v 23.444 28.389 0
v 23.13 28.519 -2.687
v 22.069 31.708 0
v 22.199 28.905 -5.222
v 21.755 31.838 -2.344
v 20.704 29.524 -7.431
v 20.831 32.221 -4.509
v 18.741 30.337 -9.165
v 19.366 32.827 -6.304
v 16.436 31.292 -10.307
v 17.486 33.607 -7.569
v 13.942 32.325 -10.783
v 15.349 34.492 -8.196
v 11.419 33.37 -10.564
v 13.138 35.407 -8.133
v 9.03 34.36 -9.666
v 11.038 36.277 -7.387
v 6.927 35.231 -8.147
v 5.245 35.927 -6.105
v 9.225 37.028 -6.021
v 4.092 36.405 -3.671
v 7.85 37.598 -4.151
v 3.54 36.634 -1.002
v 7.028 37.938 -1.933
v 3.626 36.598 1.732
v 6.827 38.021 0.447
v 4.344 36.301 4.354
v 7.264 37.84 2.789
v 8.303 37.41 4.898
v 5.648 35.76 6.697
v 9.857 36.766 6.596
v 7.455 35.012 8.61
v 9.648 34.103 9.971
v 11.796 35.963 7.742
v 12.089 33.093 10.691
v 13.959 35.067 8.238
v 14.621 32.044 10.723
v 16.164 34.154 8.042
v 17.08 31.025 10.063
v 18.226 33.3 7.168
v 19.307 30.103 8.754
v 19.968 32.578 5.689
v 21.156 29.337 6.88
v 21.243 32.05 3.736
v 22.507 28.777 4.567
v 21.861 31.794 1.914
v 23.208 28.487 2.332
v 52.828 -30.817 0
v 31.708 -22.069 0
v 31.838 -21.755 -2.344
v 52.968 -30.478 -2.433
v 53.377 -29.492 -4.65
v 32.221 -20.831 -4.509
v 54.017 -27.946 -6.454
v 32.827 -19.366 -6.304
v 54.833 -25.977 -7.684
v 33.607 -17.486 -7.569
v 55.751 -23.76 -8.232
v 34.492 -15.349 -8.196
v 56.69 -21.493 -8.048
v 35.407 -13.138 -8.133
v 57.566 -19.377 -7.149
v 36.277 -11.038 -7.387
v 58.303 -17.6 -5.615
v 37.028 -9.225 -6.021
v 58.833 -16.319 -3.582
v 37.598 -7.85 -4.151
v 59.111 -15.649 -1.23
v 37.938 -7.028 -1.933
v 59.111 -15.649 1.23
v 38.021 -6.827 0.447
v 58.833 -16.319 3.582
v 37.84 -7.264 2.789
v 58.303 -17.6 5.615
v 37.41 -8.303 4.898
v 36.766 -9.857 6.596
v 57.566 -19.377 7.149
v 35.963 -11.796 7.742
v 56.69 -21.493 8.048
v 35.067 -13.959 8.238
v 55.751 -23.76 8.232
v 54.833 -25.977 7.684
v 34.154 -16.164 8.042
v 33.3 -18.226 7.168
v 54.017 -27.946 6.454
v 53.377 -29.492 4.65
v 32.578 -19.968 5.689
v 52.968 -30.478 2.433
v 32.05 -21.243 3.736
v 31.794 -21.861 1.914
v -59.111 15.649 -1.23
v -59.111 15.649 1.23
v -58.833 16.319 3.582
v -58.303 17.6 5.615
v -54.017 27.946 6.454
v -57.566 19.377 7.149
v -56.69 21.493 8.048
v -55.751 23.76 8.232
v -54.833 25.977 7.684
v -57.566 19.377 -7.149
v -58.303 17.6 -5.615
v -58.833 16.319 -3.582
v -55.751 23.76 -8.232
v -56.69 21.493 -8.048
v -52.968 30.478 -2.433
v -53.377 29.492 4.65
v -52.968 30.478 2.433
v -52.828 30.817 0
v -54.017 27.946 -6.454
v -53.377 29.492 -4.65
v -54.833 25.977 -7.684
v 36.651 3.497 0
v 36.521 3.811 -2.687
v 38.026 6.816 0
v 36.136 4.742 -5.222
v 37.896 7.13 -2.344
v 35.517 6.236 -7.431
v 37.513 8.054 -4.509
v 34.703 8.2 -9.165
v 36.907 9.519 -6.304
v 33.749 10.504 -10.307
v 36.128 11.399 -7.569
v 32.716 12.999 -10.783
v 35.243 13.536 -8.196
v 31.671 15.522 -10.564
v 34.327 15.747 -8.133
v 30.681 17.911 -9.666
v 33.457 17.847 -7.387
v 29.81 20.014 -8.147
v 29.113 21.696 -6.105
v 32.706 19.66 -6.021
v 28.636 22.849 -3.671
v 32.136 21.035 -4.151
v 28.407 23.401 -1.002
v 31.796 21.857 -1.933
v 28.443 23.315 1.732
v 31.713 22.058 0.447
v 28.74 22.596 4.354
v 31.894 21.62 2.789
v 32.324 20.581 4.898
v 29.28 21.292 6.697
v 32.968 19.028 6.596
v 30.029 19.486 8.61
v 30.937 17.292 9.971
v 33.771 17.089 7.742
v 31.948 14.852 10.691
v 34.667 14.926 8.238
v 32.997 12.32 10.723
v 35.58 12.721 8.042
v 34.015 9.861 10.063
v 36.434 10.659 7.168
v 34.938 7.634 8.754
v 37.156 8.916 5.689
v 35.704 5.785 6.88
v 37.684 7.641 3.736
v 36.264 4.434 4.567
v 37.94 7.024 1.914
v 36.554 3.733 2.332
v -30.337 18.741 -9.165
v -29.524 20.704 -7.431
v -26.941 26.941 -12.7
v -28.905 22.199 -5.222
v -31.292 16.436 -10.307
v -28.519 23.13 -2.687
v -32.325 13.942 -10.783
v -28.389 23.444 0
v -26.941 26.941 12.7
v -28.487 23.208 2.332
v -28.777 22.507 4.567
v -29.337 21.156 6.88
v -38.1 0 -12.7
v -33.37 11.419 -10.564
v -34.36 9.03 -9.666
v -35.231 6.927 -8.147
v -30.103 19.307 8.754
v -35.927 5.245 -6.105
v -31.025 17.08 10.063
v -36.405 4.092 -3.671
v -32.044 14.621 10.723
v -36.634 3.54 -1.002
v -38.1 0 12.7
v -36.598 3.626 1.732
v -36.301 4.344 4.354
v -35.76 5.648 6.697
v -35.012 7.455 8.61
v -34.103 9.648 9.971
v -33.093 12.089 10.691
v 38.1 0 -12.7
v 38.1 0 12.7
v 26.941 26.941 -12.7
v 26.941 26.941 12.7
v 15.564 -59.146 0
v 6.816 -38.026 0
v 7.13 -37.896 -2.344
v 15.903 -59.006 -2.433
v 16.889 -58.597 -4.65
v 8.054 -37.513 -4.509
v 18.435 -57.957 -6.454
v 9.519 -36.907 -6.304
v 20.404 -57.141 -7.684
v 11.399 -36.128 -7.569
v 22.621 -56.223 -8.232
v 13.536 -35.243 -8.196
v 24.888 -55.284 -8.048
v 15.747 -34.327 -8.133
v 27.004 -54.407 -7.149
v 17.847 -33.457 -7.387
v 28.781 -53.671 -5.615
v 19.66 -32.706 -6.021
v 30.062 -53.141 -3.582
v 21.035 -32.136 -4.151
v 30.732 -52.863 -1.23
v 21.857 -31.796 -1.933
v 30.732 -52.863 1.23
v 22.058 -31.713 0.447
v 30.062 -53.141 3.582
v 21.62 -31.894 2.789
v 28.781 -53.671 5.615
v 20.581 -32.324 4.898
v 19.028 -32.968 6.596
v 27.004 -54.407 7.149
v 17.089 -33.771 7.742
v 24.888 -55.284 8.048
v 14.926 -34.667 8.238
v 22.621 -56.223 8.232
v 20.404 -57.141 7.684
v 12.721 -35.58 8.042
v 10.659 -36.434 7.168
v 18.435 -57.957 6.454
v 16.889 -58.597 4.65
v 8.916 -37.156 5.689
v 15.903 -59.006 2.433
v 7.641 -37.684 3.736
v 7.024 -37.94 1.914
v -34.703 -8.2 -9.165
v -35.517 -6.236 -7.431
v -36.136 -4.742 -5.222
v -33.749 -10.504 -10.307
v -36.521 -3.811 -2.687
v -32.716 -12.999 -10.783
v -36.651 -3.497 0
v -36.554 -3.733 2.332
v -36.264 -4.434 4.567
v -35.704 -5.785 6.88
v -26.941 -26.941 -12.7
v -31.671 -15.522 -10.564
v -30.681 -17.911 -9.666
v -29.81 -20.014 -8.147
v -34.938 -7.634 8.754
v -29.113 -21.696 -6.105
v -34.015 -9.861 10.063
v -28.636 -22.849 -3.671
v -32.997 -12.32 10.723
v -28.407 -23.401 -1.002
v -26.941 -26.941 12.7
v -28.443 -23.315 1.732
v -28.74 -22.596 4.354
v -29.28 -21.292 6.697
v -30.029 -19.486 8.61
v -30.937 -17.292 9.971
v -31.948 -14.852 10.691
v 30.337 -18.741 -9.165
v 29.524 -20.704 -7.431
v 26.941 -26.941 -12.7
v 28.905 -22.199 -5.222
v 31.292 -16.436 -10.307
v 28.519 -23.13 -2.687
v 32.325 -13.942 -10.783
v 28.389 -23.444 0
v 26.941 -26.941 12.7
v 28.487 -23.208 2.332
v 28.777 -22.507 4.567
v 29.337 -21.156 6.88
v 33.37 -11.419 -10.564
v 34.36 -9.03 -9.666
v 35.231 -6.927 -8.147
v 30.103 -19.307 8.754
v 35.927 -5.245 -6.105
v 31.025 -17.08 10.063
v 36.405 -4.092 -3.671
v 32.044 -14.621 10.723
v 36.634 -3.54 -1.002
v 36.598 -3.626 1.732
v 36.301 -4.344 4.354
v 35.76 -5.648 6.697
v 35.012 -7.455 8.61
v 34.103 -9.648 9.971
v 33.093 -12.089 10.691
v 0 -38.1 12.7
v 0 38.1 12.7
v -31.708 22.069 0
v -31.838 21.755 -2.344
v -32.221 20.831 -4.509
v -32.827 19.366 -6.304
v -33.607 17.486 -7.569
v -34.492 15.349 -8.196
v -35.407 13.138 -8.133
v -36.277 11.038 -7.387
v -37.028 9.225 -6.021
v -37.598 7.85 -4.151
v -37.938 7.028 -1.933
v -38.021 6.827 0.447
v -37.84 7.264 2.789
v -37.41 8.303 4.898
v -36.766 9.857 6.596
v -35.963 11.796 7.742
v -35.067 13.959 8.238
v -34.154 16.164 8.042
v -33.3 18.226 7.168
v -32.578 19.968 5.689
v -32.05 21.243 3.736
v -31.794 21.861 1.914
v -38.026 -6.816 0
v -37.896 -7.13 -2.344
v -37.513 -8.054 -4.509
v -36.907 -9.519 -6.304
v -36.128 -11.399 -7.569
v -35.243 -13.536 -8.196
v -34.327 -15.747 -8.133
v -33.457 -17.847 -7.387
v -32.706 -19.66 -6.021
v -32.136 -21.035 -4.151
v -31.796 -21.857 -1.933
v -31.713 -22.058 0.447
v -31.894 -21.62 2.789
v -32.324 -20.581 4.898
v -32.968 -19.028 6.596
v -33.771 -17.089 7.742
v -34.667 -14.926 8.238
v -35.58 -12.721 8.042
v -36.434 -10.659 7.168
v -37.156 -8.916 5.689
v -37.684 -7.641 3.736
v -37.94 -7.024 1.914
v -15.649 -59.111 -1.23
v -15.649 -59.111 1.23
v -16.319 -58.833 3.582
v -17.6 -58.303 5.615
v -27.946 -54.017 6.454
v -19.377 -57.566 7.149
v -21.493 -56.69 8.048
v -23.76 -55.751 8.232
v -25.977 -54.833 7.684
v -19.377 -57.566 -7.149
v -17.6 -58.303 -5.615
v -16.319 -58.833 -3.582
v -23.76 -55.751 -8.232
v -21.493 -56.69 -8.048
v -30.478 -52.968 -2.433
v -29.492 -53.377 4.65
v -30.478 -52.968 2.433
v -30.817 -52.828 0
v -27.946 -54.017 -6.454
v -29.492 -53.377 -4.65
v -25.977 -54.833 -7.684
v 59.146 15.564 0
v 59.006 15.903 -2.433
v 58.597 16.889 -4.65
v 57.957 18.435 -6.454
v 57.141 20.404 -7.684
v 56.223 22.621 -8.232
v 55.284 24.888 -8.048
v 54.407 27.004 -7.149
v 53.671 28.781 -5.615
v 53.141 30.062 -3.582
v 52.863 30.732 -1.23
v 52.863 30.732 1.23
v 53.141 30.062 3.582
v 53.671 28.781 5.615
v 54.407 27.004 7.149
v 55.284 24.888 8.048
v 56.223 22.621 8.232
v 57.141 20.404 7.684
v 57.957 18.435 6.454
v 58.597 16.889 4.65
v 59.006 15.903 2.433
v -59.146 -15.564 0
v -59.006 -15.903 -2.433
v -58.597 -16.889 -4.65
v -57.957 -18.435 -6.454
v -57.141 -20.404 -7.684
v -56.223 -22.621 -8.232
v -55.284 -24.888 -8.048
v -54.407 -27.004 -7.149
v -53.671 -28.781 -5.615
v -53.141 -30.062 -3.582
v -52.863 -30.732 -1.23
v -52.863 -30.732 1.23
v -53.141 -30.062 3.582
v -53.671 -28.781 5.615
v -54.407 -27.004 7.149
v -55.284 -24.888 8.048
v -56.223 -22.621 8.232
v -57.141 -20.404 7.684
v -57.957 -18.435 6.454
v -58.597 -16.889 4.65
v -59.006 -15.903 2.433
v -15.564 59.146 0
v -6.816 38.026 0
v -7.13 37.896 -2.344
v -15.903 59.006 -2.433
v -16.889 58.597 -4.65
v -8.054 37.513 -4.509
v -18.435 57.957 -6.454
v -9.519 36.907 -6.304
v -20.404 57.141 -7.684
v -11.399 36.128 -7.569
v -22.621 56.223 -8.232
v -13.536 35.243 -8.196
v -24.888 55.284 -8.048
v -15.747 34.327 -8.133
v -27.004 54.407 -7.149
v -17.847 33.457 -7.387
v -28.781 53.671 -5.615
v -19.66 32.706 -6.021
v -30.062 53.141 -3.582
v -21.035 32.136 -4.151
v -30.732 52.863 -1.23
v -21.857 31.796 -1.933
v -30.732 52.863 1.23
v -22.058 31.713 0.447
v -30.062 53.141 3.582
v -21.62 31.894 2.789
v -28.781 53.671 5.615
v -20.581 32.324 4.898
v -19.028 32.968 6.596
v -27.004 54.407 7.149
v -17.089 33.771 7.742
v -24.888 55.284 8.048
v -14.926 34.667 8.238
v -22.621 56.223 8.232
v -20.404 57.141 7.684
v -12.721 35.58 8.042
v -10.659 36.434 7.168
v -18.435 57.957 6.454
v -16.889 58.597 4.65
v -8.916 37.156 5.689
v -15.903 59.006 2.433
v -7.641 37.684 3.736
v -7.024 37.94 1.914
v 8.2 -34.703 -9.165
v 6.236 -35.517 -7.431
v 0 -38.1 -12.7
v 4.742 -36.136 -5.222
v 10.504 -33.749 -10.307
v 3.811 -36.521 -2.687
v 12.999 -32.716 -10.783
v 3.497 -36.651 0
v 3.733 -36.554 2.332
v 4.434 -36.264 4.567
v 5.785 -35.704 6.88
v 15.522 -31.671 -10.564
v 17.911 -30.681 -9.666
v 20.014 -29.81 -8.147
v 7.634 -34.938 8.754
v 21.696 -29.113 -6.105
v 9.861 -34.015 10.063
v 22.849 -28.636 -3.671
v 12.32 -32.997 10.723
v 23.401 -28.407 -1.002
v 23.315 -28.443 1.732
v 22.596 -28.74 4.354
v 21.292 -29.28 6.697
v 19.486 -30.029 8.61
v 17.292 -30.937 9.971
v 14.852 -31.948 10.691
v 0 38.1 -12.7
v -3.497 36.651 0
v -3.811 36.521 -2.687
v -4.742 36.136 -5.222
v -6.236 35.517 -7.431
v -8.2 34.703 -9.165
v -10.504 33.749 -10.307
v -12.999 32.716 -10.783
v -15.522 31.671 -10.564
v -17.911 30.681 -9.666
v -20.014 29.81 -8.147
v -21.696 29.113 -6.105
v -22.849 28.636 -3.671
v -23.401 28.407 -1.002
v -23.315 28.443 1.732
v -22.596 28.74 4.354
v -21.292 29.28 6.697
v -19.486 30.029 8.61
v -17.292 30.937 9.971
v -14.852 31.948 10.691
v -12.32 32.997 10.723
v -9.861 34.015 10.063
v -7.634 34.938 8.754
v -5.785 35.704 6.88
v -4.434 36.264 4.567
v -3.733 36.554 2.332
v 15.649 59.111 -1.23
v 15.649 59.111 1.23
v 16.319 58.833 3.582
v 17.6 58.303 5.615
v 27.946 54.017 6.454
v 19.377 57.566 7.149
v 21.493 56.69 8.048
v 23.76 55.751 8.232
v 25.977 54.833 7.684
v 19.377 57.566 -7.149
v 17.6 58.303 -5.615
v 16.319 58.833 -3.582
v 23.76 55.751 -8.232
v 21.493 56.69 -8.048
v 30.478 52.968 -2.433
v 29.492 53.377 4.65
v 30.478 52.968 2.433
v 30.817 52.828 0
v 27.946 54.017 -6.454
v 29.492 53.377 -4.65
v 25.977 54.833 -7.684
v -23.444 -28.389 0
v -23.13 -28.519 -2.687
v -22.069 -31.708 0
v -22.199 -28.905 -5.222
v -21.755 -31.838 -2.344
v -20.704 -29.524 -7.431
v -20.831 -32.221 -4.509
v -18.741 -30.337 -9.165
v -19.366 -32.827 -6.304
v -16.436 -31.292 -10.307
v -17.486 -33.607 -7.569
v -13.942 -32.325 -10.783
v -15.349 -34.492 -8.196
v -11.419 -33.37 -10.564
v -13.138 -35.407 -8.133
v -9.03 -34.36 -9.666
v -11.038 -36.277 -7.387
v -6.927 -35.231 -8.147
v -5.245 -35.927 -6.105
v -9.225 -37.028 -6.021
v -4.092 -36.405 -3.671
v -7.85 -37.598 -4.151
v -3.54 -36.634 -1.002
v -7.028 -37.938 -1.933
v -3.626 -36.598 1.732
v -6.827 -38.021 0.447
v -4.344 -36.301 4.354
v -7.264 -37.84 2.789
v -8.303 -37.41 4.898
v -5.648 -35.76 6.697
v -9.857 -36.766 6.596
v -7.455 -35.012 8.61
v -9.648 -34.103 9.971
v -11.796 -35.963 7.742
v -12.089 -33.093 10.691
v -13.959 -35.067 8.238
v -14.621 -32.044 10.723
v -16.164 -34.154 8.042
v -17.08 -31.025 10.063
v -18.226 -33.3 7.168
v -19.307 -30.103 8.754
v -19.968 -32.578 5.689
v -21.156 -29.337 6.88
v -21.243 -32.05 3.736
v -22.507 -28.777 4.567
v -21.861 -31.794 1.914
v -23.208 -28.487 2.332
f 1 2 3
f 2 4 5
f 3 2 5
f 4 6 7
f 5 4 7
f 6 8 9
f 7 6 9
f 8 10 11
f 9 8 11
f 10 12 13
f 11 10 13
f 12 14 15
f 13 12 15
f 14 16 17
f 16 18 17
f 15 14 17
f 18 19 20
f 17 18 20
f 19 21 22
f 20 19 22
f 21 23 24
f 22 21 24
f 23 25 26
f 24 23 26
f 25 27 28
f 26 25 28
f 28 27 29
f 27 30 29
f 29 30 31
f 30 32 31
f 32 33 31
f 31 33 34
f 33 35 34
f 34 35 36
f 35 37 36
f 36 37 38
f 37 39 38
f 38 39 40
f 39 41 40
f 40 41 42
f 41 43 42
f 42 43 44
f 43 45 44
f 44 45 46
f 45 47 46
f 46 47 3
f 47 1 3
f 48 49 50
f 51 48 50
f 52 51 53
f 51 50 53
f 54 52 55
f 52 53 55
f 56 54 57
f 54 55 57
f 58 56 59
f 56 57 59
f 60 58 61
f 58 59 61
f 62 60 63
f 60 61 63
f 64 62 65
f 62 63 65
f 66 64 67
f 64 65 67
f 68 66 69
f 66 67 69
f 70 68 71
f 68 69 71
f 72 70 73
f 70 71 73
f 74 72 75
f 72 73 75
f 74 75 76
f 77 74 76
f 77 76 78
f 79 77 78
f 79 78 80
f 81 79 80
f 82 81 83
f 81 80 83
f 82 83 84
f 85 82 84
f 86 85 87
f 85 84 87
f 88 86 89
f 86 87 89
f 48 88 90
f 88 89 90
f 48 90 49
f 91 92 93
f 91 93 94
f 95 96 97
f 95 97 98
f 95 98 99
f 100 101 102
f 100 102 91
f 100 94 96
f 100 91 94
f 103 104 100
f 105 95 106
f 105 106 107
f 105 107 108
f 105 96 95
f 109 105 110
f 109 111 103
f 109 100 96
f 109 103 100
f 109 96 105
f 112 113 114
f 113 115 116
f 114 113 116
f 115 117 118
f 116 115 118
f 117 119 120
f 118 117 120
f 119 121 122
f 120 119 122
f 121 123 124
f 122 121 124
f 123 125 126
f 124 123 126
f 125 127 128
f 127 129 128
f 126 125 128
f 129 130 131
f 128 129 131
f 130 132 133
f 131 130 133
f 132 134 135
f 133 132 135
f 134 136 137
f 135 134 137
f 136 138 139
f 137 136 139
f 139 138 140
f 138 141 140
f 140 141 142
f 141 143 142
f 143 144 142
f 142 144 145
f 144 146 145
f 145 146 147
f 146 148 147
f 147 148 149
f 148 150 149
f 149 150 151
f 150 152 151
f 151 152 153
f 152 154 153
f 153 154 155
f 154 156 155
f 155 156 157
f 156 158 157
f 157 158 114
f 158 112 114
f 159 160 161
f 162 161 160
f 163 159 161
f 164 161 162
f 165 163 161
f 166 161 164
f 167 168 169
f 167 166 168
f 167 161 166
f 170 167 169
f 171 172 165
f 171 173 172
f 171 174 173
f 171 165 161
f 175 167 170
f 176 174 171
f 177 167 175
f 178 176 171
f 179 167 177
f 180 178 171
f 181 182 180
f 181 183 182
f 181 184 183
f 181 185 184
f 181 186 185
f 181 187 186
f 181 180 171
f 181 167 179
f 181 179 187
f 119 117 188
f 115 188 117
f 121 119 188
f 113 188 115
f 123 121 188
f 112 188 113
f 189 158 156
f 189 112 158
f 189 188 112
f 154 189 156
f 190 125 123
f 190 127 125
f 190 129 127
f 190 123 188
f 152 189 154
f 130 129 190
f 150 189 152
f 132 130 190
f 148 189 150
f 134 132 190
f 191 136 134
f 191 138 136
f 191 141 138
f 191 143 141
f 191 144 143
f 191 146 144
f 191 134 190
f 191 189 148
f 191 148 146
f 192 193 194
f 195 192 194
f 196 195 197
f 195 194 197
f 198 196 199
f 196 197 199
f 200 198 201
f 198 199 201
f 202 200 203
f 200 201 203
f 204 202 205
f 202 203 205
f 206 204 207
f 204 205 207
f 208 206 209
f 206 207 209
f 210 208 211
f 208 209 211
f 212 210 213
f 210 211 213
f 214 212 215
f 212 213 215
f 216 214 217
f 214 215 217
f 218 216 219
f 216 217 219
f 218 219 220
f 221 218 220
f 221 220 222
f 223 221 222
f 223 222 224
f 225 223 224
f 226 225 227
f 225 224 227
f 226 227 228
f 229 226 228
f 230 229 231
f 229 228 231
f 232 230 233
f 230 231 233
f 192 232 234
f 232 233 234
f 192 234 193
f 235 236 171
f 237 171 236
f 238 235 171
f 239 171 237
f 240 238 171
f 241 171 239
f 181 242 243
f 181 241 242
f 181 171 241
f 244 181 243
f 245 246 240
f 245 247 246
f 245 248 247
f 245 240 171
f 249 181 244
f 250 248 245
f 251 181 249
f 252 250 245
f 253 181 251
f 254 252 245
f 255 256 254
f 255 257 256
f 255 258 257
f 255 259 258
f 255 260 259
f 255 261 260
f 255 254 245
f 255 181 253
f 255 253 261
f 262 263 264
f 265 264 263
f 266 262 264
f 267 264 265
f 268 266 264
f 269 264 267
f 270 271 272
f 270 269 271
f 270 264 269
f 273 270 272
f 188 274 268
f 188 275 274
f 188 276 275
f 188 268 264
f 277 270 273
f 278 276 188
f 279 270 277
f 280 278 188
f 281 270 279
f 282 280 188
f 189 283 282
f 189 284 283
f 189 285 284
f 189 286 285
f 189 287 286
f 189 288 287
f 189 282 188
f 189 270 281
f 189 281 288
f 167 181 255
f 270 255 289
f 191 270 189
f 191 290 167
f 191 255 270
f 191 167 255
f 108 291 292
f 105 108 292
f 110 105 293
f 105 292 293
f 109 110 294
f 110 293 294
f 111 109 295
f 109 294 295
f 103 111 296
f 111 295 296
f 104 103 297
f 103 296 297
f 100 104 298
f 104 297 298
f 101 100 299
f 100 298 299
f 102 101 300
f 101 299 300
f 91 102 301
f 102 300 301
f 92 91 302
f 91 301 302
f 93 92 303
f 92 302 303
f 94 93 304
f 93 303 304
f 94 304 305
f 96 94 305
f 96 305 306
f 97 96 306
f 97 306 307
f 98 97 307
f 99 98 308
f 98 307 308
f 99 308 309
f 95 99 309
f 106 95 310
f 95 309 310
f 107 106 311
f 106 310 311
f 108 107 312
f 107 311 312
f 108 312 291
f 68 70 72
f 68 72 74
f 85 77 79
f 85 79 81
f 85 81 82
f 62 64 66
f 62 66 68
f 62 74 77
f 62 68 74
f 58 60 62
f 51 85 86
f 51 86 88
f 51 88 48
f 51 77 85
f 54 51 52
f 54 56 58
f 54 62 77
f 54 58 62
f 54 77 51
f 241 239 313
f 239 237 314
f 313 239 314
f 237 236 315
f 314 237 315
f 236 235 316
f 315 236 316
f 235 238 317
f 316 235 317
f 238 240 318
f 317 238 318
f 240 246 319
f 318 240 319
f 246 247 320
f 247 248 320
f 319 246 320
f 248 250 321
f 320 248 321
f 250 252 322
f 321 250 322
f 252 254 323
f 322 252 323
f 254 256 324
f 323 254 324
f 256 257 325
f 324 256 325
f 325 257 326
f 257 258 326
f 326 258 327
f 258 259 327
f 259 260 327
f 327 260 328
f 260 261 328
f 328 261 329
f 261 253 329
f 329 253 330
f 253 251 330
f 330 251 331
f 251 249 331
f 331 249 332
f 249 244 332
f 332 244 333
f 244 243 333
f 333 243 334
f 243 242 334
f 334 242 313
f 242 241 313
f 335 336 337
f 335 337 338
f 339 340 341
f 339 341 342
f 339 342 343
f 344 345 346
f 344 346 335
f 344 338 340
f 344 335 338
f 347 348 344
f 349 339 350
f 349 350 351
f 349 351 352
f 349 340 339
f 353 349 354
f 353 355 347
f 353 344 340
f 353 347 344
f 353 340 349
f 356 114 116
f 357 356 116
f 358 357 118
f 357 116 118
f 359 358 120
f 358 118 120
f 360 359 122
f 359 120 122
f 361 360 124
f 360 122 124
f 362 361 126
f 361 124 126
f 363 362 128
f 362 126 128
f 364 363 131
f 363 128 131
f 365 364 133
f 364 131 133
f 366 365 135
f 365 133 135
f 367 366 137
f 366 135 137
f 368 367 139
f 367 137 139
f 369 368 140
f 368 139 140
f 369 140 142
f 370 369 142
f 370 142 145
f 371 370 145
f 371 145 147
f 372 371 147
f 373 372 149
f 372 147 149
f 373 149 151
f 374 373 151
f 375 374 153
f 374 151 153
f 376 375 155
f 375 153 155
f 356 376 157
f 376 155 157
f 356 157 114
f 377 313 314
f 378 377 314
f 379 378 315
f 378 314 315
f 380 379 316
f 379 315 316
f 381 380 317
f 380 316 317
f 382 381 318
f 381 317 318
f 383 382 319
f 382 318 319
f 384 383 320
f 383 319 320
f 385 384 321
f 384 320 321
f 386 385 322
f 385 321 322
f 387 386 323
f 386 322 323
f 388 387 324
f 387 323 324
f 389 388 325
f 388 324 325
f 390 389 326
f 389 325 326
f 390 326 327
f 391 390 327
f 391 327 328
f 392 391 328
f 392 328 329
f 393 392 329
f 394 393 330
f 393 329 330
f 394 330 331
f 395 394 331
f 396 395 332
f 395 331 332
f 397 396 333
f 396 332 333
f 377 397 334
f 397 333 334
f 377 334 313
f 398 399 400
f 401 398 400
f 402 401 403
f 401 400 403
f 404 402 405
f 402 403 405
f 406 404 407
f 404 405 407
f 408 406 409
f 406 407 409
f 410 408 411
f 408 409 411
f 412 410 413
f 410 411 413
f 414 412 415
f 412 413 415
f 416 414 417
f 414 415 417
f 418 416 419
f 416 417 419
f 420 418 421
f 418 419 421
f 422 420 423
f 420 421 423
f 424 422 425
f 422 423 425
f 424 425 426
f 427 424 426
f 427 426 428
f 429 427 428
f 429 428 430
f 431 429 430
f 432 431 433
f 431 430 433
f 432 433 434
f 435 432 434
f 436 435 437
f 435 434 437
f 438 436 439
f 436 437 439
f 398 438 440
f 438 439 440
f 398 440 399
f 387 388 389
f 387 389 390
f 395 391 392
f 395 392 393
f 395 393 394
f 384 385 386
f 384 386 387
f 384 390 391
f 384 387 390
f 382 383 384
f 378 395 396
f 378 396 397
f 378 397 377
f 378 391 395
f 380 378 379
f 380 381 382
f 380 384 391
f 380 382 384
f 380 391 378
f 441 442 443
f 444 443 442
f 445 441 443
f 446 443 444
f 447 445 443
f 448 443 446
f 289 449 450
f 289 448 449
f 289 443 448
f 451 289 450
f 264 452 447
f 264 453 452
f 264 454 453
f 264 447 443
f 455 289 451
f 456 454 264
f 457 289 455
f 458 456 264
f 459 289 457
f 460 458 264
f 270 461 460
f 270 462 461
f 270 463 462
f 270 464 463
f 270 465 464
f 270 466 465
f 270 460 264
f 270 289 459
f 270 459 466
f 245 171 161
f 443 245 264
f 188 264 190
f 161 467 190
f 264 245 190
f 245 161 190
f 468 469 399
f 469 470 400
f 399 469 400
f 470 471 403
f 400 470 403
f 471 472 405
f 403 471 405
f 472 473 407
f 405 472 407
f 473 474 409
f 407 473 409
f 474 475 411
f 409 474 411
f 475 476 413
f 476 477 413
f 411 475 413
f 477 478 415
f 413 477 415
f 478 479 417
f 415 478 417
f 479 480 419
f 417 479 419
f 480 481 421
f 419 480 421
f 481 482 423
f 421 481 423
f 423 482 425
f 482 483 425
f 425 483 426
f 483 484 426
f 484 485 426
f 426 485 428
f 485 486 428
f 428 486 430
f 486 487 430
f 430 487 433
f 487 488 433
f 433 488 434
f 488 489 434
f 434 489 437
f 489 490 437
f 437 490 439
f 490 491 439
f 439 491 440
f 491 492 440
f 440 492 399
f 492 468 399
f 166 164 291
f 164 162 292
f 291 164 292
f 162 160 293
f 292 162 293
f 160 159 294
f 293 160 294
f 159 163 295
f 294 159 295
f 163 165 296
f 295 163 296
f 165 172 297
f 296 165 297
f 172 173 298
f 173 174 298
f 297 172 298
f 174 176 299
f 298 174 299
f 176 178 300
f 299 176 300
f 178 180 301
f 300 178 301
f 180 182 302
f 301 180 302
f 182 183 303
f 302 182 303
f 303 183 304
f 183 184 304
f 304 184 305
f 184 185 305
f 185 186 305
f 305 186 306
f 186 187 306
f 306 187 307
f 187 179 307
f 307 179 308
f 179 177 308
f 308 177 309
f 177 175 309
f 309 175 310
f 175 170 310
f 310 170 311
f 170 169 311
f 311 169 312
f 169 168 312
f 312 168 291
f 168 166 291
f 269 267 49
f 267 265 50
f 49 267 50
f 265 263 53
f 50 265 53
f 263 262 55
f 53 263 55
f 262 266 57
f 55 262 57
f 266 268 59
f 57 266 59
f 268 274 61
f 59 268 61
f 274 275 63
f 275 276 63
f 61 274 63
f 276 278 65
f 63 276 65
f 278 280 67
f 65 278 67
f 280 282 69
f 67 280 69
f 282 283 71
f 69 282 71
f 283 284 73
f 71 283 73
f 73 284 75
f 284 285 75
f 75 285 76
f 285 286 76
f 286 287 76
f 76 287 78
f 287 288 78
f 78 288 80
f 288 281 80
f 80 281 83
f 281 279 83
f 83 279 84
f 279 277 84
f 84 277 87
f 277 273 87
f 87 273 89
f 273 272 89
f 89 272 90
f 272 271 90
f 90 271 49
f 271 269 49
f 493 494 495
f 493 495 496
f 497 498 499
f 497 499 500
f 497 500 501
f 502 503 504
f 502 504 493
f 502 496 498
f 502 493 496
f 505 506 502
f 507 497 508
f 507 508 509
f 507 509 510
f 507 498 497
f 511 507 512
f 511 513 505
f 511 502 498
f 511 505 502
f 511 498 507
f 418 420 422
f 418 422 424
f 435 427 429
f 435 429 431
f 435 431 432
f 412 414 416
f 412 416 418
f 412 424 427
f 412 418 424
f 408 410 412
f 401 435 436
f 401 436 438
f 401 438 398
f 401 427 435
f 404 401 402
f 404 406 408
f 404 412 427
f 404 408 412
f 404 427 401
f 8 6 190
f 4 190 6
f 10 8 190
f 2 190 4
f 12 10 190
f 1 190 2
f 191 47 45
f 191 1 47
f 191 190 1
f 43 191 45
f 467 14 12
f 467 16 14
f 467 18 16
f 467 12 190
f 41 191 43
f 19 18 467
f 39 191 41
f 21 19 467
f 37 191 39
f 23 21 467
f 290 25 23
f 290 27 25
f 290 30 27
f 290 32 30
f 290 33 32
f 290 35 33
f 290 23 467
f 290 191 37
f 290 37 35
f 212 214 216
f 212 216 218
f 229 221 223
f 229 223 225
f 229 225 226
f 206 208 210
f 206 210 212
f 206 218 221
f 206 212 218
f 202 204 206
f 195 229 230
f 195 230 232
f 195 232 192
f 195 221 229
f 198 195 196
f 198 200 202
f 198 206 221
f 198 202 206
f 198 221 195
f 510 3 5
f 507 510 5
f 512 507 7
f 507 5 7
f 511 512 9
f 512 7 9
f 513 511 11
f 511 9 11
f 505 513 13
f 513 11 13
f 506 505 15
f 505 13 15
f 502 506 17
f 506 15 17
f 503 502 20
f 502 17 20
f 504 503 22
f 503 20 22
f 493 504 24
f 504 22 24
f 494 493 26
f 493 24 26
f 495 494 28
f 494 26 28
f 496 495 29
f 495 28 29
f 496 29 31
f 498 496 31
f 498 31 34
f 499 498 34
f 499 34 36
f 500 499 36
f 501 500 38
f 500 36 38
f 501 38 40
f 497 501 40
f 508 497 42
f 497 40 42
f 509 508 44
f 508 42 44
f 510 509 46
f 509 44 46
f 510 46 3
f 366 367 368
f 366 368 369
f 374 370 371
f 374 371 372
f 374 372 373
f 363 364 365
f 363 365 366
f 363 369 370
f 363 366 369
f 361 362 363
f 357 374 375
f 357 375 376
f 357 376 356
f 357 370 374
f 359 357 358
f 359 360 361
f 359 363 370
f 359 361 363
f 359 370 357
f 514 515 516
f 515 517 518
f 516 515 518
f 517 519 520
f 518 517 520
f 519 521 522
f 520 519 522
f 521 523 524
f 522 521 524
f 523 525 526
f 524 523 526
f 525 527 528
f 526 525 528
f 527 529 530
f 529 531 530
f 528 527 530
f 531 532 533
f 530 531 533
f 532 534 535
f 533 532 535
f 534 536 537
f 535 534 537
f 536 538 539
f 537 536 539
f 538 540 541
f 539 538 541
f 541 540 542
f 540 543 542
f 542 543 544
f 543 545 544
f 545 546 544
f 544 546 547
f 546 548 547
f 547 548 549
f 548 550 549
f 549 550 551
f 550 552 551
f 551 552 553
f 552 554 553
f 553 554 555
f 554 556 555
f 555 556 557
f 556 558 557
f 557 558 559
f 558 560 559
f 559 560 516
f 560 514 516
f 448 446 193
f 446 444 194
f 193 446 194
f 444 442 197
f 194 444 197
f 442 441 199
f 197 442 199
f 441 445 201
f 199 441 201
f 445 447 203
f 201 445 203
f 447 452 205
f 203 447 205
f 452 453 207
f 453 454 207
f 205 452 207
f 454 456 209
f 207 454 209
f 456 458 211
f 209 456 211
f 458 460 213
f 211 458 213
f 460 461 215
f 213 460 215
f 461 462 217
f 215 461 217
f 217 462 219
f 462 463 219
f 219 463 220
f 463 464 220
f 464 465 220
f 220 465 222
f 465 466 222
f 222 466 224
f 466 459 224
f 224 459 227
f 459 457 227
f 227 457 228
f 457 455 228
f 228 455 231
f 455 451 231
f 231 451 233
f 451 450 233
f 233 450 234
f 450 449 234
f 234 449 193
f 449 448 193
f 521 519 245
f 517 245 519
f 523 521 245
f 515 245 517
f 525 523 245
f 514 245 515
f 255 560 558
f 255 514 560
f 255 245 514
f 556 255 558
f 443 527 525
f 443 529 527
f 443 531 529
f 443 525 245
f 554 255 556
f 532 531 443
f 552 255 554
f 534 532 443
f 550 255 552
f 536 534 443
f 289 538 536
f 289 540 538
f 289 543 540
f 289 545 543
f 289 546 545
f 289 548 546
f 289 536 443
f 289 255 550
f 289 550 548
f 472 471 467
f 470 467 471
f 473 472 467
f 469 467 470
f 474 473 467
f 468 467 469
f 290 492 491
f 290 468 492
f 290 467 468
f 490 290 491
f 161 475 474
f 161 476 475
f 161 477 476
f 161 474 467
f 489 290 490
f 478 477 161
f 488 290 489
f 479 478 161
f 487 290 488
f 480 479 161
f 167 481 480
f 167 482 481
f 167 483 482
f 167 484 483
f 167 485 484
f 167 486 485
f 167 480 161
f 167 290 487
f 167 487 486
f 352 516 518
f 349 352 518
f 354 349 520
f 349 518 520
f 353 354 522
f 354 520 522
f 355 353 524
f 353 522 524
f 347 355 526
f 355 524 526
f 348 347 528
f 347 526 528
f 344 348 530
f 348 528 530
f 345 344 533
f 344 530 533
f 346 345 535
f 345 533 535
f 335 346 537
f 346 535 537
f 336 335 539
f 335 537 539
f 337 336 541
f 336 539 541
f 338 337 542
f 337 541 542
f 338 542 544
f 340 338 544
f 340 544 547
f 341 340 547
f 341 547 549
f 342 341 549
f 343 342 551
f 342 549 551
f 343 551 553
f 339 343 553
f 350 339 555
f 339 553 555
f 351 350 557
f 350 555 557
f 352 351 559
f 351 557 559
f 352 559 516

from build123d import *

# Parameters (mm, degrees)
SKETCH1_R           = 38.1
BOSS_EXTRUDE1_DEPTH = 12.7
SKETCH2_OUTSIDE_W   = 100.344
SKETCH2_OUTSIDE_H   = 100.344
CUT_EXTRUDE1_DEPTH  = 25.4
SKETCH3_R           = 8.255
BOSS_EXTRUDE2_DEPTH = 25.4
CIRPATTERN4_COUNT   = 8
CHAMFER2_SIZE       = 2.54


with BuildPart() as part:
    # Sketch1 → Boss-Extrude1 (new body, symmetric)
    with BuildSketch(Plane.XY):
        Circle(SKETCH1_R)
    extrude(amount=BOSS_EXTRUDE1_DEPTH, both=True)

    # Sketch2 outside → Cut-Extrude1 (cut)
    with BuildSketch(Plane.XY.offset(12.7)):
        Rectangle(SKETCH2_OUTSIDE_W, SKETCH2_OUTSIDE_H)
        Polygon((38.1, 0), (26.940768363, 26.940768363), (0, 38.1), (-26.940768363, 26.940768363), (-38.1, 0), (-26.940768363, -26.940768363), (0, -38.1), (26.940768363, -26.940768363), align=None, mode=Mode.SUBTRACT)
    extrude(amount=-CUT_EXTRUDE1_DEPTH, mode=Mode.SUBTRACT)

    # Sketch3 → Boss-Extrude2 (add)
    with BuildSketch(Plane(origin=(13.470384182, 32.520384182, 0), x_dir=(0.923879533, -0.382683432, 0), z_dir=(0.382683432, 0.923879533, 0))):
        Circle(SKETCH3_R)
    boss_extrude2 = extrude(amount=BOSS_EXTRUDE2_DEPTH)

    # CirPattern4: Boss-Extrude2 ×8 about axis
    cirpattern4_axis = Axis((0, 0, 0), (0, 0, 1))
    for i in range(1, CIRPATTERN4_COUNT):
        add(boss_extrude2.rotate(cirpattern4_axis, i * 360 / CIRPATTERN4_COUNT))

    # Chamfer2
    chamfer2_edges = [part.edges().sort_by_distance(p)[0] for p in [
        (5.843758641, 35.679435916, 0),
        (29.361332447, 21.097009722, 0),
        (35.679435916, -5.843758641, 0),
        (21.097009722, -29.361332447, 0),
        (-5.843758641, -35.679435916, 0),
        (-29.361332447, -21.097009722, 0),
        (-35.679435916, 5.843758641, 0),
        (-21.097009722, 29.361332447, 0),
    ]]
    chamfer(chamfer2_edges, length=CHAMFER2_SIZE)


solid = part.part
